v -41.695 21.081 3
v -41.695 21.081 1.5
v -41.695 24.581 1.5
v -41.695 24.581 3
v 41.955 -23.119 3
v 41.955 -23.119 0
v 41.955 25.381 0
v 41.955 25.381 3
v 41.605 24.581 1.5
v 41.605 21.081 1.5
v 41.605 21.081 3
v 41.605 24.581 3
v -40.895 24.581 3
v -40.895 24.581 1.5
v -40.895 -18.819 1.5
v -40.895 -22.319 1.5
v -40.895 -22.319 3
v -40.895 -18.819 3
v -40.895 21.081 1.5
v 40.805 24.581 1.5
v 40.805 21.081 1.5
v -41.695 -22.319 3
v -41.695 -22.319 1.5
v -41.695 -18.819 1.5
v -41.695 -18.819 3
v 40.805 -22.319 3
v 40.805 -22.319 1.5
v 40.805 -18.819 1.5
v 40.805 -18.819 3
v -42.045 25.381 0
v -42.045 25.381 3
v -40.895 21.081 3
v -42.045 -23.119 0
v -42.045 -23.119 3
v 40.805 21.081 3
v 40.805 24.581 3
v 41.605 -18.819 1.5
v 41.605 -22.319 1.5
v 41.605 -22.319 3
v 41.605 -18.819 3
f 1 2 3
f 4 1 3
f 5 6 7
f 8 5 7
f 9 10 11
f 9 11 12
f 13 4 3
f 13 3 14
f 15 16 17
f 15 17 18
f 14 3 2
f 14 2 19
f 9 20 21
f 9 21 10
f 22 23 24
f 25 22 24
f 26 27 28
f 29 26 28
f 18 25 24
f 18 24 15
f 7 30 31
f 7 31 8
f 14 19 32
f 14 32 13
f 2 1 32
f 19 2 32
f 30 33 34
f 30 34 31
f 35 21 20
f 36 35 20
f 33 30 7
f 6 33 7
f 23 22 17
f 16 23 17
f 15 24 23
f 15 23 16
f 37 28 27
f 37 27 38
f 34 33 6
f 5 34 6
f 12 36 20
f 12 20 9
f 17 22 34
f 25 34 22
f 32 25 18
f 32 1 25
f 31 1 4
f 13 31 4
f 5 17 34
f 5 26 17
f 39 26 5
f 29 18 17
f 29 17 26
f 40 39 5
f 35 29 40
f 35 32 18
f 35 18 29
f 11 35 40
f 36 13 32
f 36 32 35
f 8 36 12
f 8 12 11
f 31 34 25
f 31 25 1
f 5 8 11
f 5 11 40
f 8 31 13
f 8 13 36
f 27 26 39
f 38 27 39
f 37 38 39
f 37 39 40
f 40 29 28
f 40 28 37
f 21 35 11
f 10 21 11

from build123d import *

# Parameters (mm, degrees)
F0_W     = 84
F0_H     = 48.5
F0_W_2   = 0.8
F0_H_2   = 3.5
F1_DEPTH = 3
F2_START = 1.5
F2_DEPTH = 1.5


with BuildPart() as f1:
    # F0 (on Top) → F1 (new body)
    with BuildSketch(Plane.XY):
        with Locations((-0.0453250408, 1.1309052184)):
            Rectangle(F0_W, F0_H)
        with Locations((-41.2953250408, -20.5690947816)):
            Rectangle(F0_W_2, F0_H_2, mode=Mode.SUBTRACT)
        with Locations((41.2046749592, -20.5690947816)):
            Rectangle(F0_W_2, F0_H_2, mode=Mode.SUBTRACT)
        with Locations((-41.2953250408, 22.8309052184)):
            Rectangle(F0_W_2, F0_H_2, mode=Mode.SUBTRACT)
        with Locations((41.2046749592, 22.8309052184)):
            Rectangle(F0_W_2, F0_H_2, mode=Mode.SUBTRACT)
        with Locations((41.2046749592, -20.5690947816)):
            Rectangle(F0_W_2, F0_H_2)
        with Locations((41.2046749592, 22.8309052184)):
            Rectangle(F0_W_2, F0_H_2)
        with Locations((-41.2953250408, -20.5690947816)):
            Rectangle(F0_W_2, F0_H_2)
        with Locations((-41.2953250408, 22.8309052184)):
            Rectangle(F0_W_2, F0_H_2)
    extrude(amount=F1_DEPTH)

    # F0 (on Top) → F2 (cut)
    with BuildSketch(Plane.XY.offset(F2_START)):
        with Locations((-41.2953250408, -20.5690947816)):
            Rectangle(F0_W_2, F0_H_2)
        with Locations((-41.2953250408, 22.8309052184)):
            Rectangle(F0_W_2, F0_H_2)
        with Locations((41.2046749592, -20.5690947816)):
            Rectangle(F0_W_2, F0_H_2)
        with Locations((41.2046749592, 22.8309052184)):
            Rectangle(F0_W_2, F0_H_2)
    extrude(amount=F2_DEPTH, mode=Mode.SUBTRACT)


solid = f1.part
